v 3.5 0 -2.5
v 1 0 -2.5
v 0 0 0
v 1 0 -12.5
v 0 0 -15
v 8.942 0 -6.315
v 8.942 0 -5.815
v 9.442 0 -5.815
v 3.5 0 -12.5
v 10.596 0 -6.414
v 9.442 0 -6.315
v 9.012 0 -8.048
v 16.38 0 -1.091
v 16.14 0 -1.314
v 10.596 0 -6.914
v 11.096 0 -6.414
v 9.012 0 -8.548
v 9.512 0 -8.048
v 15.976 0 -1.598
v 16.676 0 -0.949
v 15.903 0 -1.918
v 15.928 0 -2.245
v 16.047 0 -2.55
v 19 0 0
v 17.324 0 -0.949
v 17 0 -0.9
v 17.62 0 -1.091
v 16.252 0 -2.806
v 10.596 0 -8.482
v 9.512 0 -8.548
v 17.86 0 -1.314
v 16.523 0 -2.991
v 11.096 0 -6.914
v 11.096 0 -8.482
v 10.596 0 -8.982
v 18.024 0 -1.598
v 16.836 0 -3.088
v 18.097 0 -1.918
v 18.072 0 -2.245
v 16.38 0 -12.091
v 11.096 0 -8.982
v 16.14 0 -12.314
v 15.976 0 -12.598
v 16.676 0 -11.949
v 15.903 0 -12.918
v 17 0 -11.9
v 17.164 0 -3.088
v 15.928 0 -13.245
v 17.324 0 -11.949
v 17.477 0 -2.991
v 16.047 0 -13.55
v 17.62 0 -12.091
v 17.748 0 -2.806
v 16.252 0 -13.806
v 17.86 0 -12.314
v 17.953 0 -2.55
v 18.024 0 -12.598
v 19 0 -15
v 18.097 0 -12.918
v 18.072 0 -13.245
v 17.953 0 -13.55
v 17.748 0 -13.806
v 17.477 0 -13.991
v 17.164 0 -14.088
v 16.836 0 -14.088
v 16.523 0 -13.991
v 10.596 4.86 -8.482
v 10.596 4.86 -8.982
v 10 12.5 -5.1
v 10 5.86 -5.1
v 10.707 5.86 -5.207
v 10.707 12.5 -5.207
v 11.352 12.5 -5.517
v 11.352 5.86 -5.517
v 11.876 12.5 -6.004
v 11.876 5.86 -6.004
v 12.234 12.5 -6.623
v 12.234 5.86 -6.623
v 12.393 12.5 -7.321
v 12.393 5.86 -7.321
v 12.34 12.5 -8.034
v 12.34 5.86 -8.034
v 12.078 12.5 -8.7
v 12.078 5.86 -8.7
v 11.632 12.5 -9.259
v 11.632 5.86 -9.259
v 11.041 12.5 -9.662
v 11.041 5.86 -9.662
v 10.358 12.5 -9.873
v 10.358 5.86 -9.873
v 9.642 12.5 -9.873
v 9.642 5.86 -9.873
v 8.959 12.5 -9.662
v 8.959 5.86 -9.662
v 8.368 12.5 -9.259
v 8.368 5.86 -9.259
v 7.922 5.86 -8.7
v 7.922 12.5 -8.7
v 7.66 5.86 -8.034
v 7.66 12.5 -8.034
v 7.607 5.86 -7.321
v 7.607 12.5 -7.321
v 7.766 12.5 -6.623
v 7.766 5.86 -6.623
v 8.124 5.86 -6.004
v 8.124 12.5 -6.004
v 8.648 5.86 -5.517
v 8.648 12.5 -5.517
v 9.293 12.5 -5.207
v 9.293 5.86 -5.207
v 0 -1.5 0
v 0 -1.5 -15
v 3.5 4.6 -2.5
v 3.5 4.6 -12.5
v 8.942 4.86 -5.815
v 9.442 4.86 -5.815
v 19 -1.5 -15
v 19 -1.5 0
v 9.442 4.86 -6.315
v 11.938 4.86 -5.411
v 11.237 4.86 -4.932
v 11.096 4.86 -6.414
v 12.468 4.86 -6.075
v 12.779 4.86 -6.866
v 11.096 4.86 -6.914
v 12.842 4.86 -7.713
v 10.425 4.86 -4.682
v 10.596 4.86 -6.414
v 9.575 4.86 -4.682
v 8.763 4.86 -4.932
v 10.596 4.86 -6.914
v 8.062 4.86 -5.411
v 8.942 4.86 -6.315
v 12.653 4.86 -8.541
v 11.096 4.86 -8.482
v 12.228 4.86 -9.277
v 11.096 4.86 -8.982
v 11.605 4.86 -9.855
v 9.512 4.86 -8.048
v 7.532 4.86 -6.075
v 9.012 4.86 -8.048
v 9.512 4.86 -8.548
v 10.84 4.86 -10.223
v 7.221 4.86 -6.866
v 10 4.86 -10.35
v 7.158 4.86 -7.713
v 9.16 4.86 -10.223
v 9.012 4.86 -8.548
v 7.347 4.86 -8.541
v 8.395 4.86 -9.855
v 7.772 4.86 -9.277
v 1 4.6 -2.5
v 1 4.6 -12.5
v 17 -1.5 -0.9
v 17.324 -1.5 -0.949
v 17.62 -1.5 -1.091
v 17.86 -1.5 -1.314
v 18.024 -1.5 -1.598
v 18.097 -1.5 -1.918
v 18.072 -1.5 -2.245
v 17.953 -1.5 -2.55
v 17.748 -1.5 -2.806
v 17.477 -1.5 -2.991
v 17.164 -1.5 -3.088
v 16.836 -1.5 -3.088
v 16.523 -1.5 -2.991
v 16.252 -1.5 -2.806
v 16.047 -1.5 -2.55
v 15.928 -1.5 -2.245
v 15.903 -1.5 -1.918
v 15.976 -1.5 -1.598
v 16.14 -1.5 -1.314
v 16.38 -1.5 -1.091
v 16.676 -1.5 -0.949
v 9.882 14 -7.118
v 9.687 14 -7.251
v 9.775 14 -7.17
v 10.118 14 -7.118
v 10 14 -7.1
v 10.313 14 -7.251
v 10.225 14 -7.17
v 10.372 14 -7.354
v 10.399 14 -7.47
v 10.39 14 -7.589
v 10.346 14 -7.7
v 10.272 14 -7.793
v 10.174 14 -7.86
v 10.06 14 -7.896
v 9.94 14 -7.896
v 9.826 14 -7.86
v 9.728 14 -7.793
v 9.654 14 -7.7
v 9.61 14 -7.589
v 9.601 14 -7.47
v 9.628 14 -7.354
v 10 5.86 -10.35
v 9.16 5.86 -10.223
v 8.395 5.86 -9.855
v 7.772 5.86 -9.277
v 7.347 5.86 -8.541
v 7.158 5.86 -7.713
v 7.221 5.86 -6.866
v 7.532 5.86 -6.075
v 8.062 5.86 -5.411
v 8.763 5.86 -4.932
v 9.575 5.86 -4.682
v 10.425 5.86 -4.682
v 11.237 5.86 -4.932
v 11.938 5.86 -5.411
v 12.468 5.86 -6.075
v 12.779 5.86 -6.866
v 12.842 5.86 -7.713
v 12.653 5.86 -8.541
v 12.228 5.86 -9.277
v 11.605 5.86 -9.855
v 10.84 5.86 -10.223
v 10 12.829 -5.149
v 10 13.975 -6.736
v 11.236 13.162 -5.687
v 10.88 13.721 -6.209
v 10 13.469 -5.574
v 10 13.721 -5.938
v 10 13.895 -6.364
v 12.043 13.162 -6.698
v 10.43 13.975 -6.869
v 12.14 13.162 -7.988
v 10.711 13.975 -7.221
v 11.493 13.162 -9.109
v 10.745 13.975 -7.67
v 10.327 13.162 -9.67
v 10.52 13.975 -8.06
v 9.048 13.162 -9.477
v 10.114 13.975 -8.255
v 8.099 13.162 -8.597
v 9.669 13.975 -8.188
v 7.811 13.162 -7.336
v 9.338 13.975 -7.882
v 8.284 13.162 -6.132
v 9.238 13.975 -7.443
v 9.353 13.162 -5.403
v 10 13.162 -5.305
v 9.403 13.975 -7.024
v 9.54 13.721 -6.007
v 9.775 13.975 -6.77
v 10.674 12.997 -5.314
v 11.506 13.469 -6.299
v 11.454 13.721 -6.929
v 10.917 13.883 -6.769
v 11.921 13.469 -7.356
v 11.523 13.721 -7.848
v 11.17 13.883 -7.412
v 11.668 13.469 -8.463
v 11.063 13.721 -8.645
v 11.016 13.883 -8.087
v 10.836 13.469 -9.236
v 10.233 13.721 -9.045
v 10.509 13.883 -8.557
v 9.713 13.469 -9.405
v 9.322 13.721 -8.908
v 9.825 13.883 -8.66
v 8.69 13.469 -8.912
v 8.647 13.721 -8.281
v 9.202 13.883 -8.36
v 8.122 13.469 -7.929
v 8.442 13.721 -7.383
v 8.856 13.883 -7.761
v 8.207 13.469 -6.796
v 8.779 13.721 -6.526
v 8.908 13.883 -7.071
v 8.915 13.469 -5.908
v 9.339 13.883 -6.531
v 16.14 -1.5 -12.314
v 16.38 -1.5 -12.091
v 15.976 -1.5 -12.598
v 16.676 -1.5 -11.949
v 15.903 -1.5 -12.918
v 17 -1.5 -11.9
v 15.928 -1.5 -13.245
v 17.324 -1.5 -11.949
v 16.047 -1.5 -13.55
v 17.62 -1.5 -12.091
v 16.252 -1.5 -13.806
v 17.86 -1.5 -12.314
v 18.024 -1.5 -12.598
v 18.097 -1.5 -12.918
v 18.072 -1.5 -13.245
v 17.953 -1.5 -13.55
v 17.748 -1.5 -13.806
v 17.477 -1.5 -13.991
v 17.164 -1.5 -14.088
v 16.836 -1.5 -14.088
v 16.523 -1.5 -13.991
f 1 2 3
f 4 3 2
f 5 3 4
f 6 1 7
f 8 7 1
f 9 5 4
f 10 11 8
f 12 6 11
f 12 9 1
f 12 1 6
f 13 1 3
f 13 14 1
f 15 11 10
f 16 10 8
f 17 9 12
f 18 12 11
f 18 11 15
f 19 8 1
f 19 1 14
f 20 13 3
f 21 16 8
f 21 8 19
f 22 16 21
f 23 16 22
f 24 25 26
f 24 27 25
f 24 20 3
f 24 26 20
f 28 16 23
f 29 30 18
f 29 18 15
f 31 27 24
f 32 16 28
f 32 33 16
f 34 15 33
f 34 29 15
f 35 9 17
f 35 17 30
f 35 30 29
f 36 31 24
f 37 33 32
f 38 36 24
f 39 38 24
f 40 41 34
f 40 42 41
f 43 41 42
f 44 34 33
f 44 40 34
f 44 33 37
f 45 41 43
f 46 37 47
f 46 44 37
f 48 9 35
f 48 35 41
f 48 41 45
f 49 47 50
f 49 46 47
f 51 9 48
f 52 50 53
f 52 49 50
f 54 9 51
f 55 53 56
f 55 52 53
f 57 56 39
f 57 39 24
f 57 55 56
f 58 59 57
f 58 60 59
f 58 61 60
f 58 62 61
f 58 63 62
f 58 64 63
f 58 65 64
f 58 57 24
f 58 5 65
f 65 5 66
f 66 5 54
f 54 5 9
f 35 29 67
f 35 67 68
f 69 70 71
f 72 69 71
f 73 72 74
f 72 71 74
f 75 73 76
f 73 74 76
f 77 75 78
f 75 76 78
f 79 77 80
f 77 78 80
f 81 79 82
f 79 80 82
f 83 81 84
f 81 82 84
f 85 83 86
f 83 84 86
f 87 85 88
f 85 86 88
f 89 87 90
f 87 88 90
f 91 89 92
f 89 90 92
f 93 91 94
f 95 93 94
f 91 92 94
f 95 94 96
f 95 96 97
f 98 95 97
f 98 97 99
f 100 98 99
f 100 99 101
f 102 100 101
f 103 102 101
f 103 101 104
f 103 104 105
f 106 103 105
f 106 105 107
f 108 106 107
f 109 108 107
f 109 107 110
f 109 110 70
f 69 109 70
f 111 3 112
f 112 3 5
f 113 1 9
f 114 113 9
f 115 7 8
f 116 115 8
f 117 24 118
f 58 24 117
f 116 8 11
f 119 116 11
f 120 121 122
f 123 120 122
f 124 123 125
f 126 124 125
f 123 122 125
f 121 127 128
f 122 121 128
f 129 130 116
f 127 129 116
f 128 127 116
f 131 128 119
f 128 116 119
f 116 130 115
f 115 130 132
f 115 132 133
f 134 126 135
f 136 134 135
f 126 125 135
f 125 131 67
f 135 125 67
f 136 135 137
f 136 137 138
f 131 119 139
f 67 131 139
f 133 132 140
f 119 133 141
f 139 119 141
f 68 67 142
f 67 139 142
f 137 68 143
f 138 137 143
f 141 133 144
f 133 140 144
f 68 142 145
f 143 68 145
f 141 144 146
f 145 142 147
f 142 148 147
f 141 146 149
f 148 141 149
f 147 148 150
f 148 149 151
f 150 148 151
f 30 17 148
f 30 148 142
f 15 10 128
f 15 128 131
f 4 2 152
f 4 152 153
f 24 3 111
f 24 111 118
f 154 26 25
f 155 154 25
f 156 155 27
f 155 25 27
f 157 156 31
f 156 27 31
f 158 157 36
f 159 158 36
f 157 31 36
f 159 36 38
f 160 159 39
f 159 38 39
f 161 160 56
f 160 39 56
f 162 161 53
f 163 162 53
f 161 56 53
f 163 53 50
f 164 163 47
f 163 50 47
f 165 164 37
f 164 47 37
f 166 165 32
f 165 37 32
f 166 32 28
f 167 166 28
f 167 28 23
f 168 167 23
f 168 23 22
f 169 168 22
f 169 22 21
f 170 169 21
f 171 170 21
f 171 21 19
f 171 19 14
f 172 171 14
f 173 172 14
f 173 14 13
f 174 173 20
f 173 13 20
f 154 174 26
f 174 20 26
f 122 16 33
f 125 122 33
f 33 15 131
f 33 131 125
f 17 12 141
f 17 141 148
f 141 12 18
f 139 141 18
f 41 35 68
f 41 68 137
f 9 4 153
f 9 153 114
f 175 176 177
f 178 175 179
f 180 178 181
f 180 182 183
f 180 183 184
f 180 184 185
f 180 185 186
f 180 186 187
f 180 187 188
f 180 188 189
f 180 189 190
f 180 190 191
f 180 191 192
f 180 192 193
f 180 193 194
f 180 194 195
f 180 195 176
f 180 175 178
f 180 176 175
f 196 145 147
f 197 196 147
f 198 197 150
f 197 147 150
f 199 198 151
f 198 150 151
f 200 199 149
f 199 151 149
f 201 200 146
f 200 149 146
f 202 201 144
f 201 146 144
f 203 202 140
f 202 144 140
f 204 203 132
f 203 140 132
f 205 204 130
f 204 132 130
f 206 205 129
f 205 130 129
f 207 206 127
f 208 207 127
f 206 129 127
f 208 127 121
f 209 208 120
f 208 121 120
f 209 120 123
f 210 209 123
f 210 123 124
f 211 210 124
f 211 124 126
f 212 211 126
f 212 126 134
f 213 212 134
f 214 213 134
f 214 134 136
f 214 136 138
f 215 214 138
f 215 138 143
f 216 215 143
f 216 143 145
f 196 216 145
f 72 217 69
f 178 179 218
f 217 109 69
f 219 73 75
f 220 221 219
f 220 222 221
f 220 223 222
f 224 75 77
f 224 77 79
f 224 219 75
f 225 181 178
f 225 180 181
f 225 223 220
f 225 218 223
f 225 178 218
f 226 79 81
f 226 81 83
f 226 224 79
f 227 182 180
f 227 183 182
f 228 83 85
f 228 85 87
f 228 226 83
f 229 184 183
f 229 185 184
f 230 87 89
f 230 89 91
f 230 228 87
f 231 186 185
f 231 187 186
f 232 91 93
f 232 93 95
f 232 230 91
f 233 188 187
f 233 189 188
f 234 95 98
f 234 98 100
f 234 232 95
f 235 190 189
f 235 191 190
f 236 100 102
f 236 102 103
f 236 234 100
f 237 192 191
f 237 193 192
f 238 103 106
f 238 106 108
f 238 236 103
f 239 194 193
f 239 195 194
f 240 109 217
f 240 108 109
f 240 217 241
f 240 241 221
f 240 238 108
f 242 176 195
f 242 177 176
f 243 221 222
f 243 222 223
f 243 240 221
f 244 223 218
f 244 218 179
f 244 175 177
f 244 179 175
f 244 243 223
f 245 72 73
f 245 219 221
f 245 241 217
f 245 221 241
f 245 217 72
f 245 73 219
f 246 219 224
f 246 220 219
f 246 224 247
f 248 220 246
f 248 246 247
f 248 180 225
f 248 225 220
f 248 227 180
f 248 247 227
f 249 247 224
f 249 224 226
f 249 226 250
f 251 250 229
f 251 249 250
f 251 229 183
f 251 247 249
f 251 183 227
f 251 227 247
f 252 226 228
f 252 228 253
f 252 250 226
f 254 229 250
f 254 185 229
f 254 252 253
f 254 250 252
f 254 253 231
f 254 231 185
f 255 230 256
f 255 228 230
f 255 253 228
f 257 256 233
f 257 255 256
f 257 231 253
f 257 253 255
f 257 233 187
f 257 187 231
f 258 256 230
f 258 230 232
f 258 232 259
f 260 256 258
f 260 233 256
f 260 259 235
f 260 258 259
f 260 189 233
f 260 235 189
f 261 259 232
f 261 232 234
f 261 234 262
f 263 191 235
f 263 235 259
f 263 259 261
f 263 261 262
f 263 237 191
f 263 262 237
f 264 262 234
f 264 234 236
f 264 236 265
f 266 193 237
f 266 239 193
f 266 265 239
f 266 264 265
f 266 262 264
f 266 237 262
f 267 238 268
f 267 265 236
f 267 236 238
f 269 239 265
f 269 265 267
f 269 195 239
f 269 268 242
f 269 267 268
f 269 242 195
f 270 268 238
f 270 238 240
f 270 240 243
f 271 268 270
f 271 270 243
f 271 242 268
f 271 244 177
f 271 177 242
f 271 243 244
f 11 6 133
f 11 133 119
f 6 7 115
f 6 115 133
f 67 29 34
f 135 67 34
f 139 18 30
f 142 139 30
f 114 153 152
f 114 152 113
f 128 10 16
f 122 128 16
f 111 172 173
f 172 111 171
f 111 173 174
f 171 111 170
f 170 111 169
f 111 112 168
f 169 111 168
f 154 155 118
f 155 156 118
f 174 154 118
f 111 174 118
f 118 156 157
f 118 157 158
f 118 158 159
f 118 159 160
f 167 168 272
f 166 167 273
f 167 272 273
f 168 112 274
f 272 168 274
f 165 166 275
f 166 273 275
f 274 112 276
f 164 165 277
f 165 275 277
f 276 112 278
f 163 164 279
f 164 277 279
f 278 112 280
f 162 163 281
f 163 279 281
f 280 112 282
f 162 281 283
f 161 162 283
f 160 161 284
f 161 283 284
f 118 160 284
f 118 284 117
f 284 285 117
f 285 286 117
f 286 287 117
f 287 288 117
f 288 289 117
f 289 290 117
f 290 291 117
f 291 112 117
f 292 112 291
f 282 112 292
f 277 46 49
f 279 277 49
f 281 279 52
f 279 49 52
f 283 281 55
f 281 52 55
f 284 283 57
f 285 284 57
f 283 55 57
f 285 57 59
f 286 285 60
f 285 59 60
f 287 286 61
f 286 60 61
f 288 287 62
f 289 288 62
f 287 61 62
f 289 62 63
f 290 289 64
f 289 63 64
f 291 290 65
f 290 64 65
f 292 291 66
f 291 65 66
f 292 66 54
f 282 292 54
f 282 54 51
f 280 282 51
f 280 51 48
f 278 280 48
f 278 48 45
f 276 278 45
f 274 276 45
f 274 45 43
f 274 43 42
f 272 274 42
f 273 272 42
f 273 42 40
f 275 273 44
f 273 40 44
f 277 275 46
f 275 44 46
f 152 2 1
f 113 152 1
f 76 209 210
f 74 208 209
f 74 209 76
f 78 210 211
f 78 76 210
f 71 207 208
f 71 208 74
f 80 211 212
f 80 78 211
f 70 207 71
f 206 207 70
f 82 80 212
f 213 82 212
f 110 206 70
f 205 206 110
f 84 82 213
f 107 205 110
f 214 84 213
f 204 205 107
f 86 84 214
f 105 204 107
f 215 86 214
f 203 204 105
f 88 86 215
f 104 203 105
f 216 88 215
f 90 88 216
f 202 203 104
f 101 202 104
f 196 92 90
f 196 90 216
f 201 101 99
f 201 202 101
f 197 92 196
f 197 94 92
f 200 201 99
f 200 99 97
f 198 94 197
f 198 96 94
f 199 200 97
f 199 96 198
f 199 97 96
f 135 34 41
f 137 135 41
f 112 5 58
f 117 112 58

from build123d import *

# Parameters (mm, degrees)
SKETCH_1_W          = 19
SKETCH_1_H          = 15
SKETCH_1_R          = 1.1
EXTRUDE_1_DEPTH     = 1.5
SKETCH_1_4_R        = 2.4
EXTRUDE_2_DEPTH     = 14
SKETCH_1_5_R        = 2.85
EXTRUDE_3_DEPTH     = 5.86
SKETCH_1_7_R        = 2.85
CUT_EXTRUDE_1_DEPTH = 4.86
SKETCH_1_8_W        = 0.5
SKETCH_1_8_H        = 0.5
EXTRUDE_4_DEPTH     = 4.86
FILLET_3_SIZE       = 1.5
FILLET_3_SIZE_2     = 2
SKETCH_1_9_W        = 2.5
SKETCH_1_9_H        = 10
EXTRUDE_5_DEPTH     = 4.6


with BuildPart() as part:
    # 草图1 → 凸台-拉伸1 (new body)
    with BuildSketch(Plane(origin=(0, 0, 0), x_dir=(1, 0, 0), z_dir=(0, 1, 0))):
        with Locations((9.5, 7.5)):
            Rectangle(SKETCH_1_W, SKETCH_1_H)
        with Locations(Location((17, 13, 0), (0, 0, 270))):
            Circle(SKETCH_1_R, mode=Mode.SUBTRACT)
        with Locations(Location((17, 2, 0), (0, 0, 270))):
            Circle(SKETCH_1_R, mode=Mode.SUBTRACT)
    extrude(amount=-EXTRUDE_1_DEPTH)

    # 草图1<4> → 凸台-拉伸2 (add)
    with BuildSketch(Plane(origin=(0, 0, 0), x_dir=(1, 0, 0), z_dir=(0, 1, 0))):
        with Locations(Location((10, 7.5, 0), (0, 0, 270))):
            Circle(SKETCH_1_4_R)
    extrude(amount=EXTRUDE_2_DEPTH)

    # 草图1<5> → 凸台-拉伸3 (add)
    with BuildSketch(Plane(origin=(0, 0, 0), x_dir=(1, 0, 0), z_dir=(0, 1, 0))):
        with Locations(Location((10, 7.5, 0), (0, 0, 90))):
            Circle(SKETCH_1_5_R)
    extrude(amount=EXTRUDE_3_DEPTH)

    # 草图1<7> → 切除-拉伸1 (cut)
    with BuildSketch(Plane(origin=(0, 0, 0), x_dir=(1, 0, 0), z_dir=(0, 1, 0))):
        with Locations(Location((10, 7.5, 0), (0, 0, 90))):
            Circle(SKETCH_1_7_R)
    extrude(amount=CUT_EXTRUDE_1_DEPTH, mode=Mode.SUBTRACT)


with BuildPart() as cut_extrude_1_piece_1:
    # of the separate pieces the step leaves, piece 1, a body of its own (cut_extrude_1_pieces)
    add(part.part.solids().sort_by_distance((0, 0, 0))[0])



with BuildPart() as cut_extrude_1_piece_2:
    # of the separate pieces the step leaves, piece 2, a body of its own (cut_extrude_1_pieces)
    add(part.part.solids().sort_by_distance((10, 4.86, -10.35))[0])


with BuildPart() as cut_extrude_1_piece_1_1:
    add(cut_extrude_1_piece_1.part)

    add(cut_extrude_1_piece_2.part)  # 凸台-拉伸4 merges 切除-拉伸1 piece 2
    # 草图1<8> → 凸台-拉伸4 (add)
    with BuildSketch(Plane(origin=(0, 0, 0), x_dir=(1, 0, 0), z_dir=(0, 1, 0))):
        with Locations((9.262196887, 8.297981086)):
            Rectangle(SKETCH_1_8_W, SKETCH_1_8_H)
        with Locations((9.191679648, 6.064699679)):
            Rectangle(SKETCH_1_8_W, SKETCH_1_8_H)
        with Locations((10.845962172, 6.664377094)):
            Rectangle(SKETCH_1_8_W, SKETCH_1_8_H)
        with Locations((10.845962172, 8.732230249)):
            Rectangle(SKETCH_1_8_W, SKETCH_1_8_H)
    extrude(amount=EXTRUDE_4_DEPTH)

    # 圆角3
    # an asymmetric fillet: 2, 1.5 mm, written as the material it takes off along each edge
    with BuildSketch(Plane(origin=(10, 14, -7.5), x_dir=(0, 0, 1), z_dir=(-1, 0, 0))) as fillet_3_piece_1:
        with BuildLine():
            Bezier((2.4, -FILLET_3_SIZE), (2.4, 0), (2.4 - FILLET_3_SIZE_2, 0), weights=[1, 0.707106781, 1])
            Line((2.4 - FILLET_3_SIZE_2, 0), (2.4, 0))
            Line((2.4, 0), (2.4, -FILLET_3_SIZE))
        make_face()
    revolve(axis=Axis((10, 14, -7.5), (0, 1, 0)), mode=Mode.SUBTRACT)

    # 草图1<9> → 凸台-拉伸5 (add)
    with BuildSketch(Plane(origin=(0, 0, 0), x_dir=(1, 0, 0), z_dir=(0, 1, 0))):
        with Locations((2.25, 7.5)):
            Rectangle(SKETCH_1_9_W, SKETCH_1_9_H)
    extrude(amount=EXTRUDE_5_DEPTH)


solid = cut_extrude_1_piece_1_1.part
